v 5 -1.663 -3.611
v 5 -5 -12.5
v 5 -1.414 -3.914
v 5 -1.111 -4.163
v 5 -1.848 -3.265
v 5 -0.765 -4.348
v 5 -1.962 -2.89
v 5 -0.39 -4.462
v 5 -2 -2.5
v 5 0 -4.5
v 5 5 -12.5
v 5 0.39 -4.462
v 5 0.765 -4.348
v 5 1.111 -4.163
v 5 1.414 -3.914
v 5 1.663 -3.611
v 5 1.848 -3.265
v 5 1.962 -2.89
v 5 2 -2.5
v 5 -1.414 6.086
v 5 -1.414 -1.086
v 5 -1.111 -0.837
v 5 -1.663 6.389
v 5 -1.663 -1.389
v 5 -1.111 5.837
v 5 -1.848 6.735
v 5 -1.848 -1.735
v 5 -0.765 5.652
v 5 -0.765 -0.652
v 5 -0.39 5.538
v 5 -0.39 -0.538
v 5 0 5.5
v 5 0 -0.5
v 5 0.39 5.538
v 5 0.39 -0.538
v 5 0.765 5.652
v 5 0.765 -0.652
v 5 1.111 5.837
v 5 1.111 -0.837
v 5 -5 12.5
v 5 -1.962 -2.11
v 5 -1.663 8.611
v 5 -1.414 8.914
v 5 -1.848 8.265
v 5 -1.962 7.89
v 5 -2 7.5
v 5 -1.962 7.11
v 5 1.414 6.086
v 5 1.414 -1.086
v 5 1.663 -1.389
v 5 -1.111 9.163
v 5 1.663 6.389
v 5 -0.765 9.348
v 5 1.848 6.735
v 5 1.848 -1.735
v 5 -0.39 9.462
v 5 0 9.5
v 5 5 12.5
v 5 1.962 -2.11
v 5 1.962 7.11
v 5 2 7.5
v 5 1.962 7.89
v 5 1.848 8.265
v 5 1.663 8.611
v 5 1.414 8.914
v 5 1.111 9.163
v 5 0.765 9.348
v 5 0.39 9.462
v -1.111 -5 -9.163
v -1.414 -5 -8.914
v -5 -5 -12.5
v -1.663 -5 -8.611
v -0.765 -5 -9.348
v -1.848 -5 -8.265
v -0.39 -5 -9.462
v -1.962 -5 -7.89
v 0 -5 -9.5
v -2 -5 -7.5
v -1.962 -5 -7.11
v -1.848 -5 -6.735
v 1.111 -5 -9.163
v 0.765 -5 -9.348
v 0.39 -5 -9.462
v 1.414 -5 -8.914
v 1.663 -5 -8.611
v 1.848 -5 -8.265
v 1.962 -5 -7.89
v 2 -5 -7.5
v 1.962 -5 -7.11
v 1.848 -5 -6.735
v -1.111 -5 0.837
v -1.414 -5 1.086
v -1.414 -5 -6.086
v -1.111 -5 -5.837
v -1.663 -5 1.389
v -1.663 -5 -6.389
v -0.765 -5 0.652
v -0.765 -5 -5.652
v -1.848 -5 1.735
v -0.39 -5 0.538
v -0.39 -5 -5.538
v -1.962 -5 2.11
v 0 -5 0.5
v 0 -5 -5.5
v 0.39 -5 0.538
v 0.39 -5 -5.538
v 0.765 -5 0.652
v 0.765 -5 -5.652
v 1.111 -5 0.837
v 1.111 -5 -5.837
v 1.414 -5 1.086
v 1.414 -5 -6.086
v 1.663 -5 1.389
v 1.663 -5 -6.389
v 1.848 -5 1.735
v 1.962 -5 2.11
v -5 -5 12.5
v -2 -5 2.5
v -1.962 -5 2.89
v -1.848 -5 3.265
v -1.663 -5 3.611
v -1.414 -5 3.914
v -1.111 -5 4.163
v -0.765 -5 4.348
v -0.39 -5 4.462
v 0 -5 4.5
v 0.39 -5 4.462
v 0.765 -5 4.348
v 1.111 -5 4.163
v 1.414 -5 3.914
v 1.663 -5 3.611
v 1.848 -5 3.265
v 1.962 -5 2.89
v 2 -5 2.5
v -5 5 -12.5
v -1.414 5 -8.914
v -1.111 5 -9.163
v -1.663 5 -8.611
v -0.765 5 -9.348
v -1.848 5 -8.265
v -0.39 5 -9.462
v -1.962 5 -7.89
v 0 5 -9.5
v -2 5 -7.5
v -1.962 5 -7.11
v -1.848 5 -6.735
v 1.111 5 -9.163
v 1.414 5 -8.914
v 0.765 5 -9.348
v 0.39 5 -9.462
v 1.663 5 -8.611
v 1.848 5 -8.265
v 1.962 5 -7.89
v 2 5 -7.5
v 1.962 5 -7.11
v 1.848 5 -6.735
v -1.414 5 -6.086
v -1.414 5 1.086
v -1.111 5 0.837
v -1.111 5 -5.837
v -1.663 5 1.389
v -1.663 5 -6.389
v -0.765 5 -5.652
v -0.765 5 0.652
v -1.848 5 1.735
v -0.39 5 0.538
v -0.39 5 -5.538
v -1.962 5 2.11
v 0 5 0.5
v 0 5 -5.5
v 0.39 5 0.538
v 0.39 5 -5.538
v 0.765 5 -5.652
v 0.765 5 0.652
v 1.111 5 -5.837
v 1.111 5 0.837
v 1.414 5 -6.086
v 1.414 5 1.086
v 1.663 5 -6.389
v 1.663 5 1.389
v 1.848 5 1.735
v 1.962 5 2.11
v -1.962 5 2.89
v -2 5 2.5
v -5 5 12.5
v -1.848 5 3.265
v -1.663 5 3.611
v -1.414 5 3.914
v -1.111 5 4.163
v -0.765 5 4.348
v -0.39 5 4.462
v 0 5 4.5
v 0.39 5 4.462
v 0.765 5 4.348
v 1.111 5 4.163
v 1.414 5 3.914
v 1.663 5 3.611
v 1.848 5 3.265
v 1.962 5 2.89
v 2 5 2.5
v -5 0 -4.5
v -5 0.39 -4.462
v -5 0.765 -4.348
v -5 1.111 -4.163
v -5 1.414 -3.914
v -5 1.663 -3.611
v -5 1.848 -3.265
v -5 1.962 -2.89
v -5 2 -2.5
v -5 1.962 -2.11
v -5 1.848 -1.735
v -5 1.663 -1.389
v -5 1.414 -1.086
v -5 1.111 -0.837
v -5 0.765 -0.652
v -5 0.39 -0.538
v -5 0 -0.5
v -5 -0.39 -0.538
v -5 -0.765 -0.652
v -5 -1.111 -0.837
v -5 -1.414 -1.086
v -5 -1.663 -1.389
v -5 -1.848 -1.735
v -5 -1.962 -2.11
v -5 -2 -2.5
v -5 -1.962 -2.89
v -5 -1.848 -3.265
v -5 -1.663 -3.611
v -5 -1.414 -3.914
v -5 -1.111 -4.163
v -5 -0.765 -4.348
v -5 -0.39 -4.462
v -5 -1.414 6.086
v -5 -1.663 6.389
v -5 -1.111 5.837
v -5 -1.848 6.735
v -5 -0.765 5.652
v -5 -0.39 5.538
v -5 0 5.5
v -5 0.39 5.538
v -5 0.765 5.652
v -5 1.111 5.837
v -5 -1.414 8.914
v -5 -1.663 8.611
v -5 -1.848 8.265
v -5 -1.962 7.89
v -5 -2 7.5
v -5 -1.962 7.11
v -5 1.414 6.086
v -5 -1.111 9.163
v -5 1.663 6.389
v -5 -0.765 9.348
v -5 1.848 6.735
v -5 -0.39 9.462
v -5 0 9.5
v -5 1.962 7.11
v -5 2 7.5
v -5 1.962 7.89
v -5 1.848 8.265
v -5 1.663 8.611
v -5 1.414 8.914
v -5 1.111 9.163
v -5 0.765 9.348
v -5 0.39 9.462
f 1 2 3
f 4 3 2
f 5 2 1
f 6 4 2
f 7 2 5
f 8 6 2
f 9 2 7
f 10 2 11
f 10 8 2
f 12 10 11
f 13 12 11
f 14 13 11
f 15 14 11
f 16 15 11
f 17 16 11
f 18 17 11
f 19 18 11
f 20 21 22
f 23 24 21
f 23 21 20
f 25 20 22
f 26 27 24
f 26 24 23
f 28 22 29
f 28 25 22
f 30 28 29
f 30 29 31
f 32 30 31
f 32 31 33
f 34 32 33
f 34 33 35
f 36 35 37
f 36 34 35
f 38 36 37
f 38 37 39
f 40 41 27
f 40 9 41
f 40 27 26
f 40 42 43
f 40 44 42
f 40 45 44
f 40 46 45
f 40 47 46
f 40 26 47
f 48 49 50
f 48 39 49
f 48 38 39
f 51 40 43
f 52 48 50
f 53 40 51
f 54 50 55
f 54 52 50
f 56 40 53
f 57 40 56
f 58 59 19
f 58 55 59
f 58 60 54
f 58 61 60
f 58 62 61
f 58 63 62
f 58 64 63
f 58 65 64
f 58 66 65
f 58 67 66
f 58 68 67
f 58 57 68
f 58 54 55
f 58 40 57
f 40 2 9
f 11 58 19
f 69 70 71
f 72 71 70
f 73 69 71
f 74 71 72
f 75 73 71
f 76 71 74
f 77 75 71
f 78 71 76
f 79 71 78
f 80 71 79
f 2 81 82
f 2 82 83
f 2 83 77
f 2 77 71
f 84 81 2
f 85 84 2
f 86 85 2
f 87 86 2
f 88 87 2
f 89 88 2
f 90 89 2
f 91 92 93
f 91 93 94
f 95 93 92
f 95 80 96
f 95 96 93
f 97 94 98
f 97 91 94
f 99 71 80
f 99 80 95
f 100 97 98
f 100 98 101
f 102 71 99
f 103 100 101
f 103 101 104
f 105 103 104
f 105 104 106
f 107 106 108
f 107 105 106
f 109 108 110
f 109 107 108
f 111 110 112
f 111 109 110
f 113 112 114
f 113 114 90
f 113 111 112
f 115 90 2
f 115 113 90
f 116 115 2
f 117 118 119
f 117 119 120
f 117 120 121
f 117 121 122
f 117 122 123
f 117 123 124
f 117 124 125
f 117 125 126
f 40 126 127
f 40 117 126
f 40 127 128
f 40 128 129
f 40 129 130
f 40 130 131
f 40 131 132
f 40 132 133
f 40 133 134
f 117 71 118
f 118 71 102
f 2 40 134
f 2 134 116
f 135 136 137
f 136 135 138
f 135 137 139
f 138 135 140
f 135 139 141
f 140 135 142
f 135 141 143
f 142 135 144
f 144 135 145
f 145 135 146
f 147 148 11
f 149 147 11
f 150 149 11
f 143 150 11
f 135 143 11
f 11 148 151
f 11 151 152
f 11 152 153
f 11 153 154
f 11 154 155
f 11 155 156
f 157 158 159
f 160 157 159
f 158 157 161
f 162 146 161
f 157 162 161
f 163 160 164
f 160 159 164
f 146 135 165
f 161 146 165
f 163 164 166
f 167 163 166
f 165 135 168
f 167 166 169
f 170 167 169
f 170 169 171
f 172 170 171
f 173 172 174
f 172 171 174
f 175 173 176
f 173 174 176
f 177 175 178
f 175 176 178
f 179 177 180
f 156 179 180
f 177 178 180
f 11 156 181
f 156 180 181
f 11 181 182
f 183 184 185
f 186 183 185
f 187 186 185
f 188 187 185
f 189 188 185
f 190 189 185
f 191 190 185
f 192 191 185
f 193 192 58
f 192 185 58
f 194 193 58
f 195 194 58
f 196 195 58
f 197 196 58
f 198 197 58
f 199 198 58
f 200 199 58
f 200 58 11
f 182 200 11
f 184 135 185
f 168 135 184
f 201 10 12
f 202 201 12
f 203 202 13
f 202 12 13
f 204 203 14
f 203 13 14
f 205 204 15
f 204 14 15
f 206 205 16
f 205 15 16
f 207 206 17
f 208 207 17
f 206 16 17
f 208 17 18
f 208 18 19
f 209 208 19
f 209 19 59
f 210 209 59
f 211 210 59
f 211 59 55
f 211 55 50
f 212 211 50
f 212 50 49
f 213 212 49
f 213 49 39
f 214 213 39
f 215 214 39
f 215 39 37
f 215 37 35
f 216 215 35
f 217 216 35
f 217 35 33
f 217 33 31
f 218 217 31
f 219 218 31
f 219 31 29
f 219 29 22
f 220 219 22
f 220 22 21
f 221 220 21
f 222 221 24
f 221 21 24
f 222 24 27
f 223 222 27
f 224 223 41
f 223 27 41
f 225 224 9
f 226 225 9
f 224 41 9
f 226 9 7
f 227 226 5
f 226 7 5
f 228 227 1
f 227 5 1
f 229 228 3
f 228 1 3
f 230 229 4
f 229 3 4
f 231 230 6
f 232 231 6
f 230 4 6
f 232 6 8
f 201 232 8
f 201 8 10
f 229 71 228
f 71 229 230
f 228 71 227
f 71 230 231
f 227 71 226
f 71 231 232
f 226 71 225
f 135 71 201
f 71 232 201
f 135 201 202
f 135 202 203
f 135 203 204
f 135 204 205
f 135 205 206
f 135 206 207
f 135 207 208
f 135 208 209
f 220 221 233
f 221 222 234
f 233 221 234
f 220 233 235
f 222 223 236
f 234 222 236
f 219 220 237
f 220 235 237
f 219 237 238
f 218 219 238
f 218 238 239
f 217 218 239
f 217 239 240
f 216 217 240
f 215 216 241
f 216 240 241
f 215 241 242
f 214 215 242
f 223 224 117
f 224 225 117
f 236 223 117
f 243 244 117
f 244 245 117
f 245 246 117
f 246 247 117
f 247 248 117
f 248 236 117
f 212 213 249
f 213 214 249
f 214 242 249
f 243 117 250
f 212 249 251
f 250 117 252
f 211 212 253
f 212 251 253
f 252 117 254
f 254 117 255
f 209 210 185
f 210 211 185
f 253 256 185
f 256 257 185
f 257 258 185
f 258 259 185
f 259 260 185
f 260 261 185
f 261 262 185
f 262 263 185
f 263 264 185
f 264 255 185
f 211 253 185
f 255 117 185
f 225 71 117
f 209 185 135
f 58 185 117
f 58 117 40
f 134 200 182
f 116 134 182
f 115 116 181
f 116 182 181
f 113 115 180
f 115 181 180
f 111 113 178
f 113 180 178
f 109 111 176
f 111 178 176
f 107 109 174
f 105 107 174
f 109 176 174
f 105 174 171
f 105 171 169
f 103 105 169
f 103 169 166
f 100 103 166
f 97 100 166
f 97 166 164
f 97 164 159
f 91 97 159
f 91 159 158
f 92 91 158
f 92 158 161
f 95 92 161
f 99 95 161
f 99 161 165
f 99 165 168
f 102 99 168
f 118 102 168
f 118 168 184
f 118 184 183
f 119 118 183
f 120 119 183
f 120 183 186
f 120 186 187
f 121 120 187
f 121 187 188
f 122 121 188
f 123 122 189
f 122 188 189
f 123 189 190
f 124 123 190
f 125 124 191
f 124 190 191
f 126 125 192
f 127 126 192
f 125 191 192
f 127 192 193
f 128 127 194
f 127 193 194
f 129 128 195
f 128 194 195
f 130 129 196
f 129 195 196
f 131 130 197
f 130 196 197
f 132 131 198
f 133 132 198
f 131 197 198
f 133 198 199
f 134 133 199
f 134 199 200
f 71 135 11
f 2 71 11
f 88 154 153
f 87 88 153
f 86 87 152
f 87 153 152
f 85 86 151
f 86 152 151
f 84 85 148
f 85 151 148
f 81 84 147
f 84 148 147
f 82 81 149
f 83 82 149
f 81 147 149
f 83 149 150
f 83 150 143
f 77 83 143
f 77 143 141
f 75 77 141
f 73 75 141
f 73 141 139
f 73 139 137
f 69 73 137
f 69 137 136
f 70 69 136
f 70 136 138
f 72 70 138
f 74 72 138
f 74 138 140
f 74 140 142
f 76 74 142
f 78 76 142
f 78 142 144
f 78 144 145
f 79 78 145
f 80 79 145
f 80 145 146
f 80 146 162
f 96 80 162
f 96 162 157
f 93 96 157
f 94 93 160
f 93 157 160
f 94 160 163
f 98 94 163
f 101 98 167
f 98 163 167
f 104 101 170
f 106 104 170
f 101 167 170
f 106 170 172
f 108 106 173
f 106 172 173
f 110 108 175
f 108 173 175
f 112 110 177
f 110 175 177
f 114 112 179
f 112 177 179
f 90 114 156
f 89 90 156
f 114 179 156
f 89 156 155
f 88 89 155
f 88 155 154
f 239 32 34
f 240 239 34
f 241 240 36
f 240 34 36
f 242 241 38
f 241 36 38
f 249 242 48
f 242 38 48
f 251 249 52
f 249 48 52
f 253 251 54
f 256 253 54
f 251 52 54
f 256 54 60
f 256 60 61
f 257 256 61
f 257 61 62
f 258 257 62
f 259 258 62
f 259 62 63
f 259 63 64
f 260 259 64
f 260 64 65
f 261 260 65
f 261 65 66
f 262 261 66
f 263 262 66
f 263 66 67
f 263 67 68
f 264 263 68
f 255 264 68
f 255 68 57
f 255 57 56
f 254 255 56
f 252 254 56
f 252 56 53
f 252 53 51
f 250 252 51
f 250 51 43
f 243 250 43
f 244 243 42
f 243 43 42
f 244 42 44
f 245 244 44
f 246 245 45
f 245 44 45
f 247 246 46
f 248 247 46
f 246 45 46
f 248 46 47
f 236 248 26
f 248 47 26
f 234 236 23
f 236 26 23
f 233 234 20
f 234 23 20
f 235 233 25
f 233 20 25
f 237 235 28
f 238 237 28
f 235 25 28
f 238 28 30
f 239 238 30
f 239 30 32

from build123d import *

# Parameters (mm, degrees)
SKETCH_1_W          = 10
SKETCH_1_H          = 10
EXTRUDE_1_DEPTH     = 12.5
SKETCH_2_R          = 2
CUT_EXTRUDE_1_DEPTH = 25
SKETCH_3_R          = 2
CUT_EXTRUDE_2_DEPTH = 25


with BuildPart() as part:
    # 草图1 → 凸台-拉伸1 (new body, symmetric)
    with BuildSketch(Plane.XY):
        Rectangle(SKETCH_1_W, SKETCH_1_H)
    extrude(amount=EXTRUDE_1_DEPTH, both=True)

    # 草图2 → 切除-拉伸1 (cut)
    with BuildSketch(Plane(origin=(5, 0, 0), x_dir=(0, 0, -1), z_dir=(1, 0, 0))):
        with Locations((-7.5, 0)):
            Circle(SKETCH_2_R)
        with Locations((2.5, 0)):
            Circle(SKETCH_2_R)
    extrude(amount=-CUT_EXTRUDE_1_DEPTH, mode=Mode.SUBTRACT)

    # 草图3 → 切除-拉伸2 (cut)
    with BuildSketch(Plane(origin=(0, 5, 0), x_dir=(1, 0, 0), z_dir=(0, 1, 0))):
        with Locations((0, 7.5)):
            Circle(SKETCH_3_R)
        with Locations((0, -2.5)):
            Circle(SKETCH_3_R)
    extrude(amount=-CUT_EXTRUDE_2_DEPTH, mode=Mode.SUBTRACT)


solid = part.part
